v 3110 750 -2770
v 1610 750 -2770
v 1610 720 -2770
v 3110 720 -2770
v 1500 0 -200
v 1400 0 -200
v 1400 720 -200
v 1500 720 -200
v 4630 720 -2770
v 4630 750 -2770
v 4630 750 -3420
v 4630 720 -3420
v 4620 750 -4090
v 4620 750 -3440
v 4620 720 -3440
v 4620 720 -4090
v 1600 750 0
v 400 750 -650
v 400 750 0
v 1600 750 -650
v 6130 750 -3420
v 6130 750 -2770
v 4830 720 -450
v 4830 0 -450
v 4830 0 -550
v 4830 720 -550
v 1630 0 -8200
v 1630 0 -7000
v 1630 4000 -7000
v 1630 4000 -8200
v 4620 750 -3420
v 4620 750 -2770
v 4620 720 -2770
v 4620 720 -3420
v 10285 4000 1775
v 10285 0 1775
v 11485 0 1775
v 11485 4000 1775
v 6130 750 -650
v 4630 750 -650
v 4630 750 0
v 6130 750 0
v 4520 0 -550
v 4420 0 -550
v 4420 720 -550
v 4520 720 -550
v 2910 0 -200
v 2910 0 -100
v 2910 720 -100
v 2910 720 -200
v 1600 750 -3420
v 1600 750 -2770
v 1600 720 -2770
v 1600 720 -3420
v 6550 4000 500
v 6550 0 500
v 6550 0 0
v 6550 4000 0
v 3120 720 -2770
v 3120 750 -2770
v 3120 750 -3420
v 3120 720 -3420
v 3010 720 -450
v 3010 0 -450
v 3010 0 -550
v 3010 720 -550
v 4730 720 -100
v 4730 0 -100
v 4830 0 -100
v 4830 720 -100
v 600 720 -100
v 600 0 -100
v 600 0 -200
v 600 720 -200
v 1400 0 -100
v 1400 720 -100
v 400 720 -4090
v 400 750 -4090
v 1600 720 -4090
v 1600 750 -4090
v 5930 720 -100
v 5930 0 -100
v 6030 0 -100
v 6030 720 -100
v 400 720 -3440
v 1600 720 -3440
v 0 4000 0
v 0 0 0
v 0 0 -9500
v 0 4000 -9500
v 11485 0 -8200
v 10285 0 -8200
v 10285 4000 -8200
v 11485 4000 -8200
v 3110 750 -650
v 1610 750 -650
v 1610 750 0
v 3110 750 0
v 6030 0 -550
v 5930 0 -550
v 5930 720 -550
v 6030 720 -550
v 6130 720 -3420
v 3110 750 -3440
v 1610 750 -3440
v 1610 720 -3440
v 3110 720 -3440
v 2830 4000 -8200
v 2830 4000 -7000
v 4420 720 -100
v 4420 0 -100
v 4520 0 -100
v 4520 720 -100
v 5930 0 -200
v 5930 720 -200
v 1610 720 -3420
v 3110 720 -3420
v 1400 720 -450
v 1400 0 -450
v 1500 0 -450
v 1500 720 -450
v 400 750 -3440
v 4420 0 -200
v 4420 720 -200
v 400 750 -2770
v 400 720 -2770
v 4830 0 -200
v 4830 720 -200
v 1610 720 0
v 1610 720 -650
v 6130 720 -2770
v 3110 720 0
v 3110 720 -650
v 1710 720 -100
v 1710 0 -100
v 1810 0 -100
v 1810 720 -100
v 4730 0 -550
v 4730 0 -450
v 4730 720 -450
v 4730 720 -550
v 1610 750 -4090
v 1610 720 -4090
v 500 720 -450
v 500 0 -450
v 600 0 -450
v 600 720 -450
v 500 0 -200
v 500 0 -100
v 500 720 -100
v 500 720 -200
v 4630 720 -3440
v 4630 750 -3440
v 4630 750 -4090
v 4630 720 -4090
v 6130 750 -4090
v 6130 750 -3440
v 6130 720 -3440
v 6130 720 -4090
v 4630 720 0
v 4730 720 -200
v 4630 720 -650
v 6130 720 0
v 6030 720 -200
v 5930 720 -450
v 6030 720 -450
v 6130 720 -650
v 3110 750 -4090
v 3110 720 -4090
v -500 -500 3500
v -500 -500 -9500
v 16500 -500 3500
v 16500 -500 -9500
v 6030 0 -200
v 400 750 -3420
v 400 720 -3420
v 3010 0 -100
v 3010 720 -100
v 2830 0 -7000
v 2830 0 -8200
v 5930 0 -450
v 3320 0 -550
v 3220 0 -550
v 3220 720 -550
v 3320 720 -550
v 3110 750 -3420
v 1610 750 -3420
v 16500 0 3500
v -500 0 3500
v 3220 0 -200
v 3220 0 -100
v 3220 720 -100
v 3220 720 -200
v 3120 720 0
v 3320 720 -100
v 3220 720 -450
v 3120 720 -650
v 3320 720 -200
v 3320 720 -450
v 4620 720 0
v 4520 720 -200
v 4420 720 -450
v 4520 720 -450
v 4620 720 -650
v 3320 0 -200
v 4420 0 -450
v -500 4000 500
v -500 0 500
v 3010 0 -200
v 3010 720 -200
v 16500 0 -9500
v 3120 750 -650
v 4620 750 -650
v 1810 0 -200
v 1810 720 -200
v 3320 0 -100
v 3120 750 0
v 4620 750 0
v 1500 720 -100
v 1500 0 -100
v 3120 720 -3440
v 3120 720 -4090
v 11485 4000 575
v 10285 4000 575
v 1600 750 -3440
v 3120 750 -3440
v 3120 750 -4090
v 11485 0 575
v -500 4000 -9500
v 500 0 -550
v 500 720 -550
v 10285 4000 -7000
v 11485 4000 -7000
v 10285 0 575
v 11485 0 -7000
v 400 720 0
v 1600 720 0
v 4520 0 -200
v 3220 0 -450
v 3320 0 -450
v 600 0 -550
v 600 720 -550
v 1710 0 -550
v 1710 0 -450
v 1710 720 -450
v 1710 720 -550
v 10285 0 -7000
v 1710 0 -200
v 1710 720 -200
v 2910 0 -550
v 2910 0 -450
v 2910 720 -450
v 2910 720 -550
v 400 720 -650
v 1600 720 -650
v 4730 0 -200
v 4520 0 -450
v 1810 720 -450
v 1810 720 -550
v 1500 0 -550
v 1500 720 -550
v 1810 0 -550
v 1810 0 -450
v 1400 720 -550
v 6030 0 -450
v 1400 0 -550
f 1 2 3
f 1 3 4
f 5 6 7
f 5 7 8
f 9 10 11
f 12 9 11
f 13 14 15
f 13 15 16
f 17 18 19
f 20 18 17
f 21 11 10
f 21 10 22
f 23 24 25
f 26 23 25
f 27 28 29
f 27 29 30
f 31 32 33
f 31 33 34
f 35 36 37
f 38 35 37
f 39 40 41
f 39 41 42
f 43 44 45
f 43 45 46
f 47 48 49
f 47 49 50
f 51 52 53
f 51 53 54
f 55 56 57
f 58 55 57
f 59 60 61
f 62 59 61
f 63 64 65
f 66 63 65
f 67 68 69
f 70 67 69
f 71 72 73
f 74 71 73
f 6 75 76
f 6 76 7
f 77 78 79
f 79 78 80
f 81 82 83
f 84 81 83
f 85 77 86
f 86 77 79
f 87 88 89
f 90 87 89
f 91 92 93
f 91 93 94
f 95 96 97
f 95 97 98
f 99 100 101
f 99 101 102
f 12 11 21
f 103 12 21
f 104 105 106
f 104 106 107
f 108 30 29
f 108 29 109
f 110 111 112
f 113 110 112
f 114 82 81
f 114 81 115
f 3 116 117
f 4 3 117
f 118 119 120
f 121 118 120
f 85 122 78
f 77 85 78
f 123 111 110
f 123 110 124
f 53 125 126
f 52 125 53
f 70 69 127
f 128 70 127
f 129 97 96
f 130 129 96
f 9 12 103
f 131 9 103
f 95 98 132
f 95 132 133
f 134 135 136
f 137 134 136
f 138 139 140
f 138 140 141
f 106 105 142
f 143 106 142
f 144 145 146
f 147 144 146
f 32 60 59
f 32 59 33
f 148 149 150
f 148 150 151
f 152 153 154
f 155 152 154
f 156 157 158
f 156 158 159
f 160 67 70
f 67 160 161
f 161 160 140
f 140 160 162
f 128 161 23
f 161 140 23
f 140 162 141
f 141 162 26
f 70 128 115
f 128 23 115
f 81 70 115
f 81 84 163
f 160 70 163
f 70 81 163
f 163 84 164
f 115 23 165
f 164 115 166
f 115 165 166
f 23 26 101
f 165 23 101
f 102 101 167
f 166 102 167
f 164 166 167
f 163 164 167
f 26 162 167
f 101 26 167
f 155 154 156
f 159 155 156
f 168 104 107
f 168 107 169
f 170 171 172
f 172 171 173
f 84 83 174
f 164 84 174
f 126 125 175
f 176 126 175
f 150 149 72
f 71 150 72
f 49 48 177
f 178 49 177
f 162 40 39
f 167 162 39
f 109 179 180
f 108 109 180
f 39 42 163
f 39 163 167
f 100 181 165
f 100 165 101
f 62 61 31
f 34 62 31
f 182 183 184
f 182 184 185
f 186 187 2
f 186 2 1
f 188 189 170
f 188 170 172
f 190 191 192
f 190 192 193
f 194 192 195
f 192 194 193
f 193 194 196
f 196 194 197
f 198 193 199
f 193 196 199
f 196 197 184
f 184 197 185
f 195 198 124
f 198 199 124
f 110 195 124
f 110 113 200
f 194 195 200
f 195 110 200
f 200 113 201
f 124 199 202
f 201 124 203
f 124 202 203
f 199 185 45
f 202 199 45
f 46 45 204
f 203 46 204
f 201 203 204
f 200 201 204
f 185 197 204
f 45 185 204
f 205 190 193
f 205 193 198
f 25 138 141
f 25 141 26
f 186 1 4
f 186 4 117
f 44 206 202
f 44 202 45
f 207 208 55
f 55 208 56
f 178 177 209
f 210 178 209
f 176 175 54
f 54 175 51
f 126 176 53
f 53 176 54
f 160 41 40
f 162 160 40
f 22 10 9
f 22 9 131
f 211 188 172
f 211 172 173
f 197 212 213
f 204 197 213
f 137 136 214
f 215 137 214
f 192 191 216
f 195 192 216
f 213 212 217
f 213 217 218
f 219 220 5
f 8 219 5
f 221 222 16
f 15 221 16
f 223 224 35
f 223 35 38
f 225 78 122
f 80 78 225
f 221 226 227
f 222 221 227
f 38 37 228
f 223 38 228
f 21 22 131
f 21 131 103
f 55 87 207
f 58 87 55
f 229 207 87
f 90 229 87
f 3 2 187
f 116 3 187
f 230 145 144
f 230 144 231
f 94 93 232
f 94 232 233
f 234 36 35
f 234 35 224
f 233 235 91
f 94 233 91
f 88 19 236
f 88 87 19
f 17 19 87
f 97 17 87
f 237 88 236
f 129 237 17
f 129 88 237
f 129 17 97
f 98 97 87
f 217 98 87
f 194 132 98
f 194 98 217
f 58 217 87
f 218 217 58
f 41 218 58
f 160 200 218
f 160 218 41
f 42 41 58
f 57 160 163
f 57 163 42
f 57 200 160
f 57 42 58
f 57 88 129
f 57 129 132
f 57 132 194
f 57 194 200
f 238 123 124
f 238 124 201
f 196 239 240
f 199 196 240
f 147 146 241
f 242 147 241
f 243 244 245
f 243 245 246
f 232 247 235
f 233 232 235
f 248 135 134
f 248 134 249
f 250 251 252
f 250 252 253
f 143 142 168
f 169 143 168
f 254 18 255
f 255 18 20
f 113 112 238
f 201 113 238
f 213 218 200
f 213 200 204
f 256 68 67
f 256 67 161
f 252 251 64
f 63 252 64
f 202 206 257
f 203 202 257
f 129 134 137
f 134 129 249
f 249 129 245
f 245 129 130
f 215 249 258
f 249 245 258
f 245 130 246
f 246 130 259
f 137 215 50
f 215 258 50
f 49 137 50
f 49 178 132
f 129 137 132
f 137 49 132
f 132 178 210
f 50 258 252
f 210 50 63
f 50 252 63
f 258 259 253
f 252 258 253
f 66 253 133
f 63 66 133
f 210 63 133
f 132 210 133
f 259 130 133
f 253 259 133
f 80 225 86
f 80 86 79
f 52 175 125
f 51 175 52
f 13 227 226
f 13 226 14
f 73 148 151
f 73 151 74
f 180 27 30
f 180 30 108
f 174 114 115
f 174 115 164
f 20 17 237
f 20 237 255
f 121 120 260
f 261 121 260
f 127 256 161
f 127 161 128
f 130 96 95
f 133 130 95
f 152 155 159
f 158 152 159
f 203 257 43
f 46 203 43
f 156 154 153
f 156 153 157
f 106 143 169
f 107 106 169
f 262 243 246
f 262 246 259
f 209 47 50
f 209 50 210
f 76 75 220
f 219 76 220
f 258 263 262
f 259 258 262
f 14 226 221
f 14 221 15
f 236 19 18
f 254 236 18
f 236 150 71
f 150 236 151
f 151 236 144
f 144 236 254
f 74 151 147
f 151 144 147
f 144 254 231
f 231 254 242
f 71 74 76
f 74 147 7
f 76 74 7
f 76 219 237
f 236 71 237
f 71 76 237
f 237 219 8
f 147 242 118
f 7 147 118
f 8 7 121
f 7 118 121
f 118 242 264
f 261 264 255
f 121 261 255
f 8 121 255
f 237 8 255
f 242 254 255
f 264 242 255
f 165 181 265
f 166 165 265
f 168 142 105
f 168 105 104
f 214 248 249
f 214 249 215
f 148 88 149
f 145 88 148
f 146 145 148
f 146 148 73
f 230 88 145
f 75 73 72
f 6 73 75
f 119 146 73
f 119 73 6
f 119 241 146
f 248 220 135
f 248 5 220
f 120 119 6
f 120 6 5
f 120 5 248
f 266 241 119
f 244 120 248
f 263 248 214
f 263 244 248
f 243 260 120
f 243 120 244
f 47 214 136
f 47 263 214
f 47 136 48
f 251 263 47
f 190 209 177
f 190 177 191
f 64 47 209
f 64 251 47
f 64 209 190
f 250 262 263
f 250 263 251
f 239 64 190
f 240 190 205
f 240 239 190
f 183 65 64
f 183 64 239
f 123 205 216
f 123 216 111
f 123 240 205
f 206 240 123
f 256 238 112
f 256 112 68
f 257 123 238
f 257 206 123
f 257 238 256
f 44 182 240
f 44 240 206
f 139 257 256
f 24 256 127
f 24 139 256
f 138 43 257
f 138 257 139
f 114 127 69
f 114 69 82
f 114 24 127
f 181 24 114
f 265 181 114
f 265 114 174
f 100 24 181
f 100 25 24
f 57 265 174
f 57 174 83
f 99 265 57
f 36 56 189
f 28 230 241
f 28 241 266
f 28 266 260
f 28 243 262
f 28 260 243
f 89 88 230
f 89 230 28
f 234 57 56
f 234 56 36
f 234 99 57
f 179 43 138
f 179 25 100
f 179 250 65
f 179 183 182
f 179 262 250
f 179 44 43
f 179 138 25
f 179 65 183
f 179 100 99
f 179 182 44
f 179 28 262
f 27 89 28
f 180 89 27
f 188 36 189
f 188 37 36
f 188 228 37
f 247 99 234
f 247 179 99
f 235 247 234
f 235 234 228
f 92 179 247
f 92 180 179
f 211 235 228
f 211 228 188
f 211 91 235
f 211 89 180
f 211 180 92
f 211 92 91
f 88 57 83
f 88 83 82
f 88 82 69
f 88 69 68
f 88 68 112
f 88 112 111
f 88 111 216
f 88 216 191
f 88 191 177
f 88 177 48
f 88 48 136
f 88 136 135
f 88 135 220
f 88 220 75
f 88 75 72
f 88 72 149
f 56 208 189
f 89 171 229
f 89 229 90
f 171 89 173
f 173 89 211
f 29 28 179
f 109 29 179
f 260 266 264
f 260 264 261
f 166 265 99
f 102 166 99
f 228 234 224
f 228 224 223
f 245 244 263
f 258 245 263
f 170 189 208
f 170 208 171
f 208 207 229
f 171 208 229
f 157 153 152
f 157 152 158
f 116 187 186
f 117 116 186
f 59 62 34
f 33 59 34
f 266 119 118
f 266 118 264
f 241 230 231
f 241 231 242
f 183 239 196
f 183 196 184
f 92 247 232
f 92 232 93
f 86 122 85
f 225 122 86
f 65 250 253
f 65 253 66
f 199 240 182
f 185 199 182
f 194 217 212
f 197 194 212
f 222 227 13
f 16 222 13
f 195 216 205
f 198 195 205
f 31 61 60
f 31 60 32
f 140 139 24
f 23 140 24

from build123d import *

# Parameters (mm, degrees)
SKETCH_2_W      = 6550
SKETCH_2_H      = 500
SKETCH_2_W_2    = 1200
SKETCH_2_H_2    = 1200
EXTRUDE_5_DEPTH = 4000
SKETCH_3_W      = 17000
SKETCH_3_H      = 13000
EXTRUDE_6_DEPTH = 500
EXTRUDE_START   = 750
SKETCH_4_W      = 1200
SKETCH_4_H      = 650
SKETCH_4_W_2    = 1500
EXTRUDE_7_DEPTH = 30
SKETCH_4_3_W    = 100
SKETCH_4_3_H    = 100
EXTRUDE_8_DEPTH = 720


with BuildPart() as part:
    # 草图2 → 凸台-拉伸5 (new body)
    with BuildSketch(Plane(origin=(0, 0, 0), x_dir=(1, 0, 0), z_dir=(0, 1, 0))):
        Polygon((-500, -500), (0, -500), (0, 0), (0, 9500), (-500, 9500), align=None)
        with Locations((3275, -250)):
            Rectangle(SKETCH_2_W, SKETCH_2_H)
        with Locations((2230, 7600)):
            Rectangle(SKETCH_2_W_2, SKETCH_2_H_2)
        with Locations((10885, 7600)):
            Rectangle(SKETCH_2_W_2, SKETCH_2_H_2)
        with Locations((10885, -1175)):
            Rectangle(SKETCH_2_W_2, SKETCH_2_H_2)
    extrude(amount=EXTRUDE_5_DEPTH)

    # 草图3 → 凸台-拉伸6 (add)
    with BuildSketch(Plane(origin=(0, 0, 0), x_dir=(1, 0, 0), z_dir=(0, 1, 0))):
        with Locations((8000, 3000)):
            Rectangle(SKETCH_3_W, SKETCH_3_H)
    extrude(amount=-EXTRUDE_6_DEPTH)

    # 草图4 → 凸台-拉伸7 (add)
    with BuildSketch(Plane(origin=(0, 0, 0), x_dir=(1, 0, 0), z_dir=(0, 1, 0)).offset(EXTRUDE_START)):
        with Locations((1000, 325)):
            Rectangle(SKETCH_4_W, SKETCH_4_H)
        with Locations((2360, 325)):
            Rectangle(SKETCH_4_W_2, SKETCH_4_H)
        with Locations((5380, 3095)):
            Rectangle(SKETCH_4_W_2, SKETCH_4_H)
        with Locations((3870, 325)):
            Rectangle(SKETCH_4_W_2, SKETCH_4_H)
        with Locations((5380, 325)):
            Rectangle(SKETCH_4_W_2, SKETCH_4_H)
        with Locations((1000, 3095)):
            Rectangle(SKETCH_4_W, SKETCH_4_H)
        with Locations((2360, 3095)):
            Rectangle(SKETCH_4_W_2, SKETCH_4_H)
        with Locations((1000, 3765)):
            Rectangle(SKETCH_4_W, SKETCH_4_H)
        with Locations((3870, 3095)):
            Rectangle(SKETCH_4_W_2, SKETCH_4_H)
        with Locations((2360, 3765)):
            Rectangle(SKETCH_4_W_2, SKETCH_4_H)
        with Locations((3870, 3765)):
            Rectangle(SKETCH_4_W_2, SKETCH_4_H)
        with Locations((5380, 3765)):
            Rectangle(SKETCH_4_W_2, SKETCH_4_H)
    extrude(amount=-EXTRUDE_7_DEPTH)


with BuildPart() as extrude_7_piece_1:
    # of the separate pieces the step leaves, piece 1, a body of its own (extrude_7_pieces)
    add(part.part.solids().sort_by_distance((-500, 0, 500))[0])

    # 草图4<3> → 凸台-拉伸8 (add)
    with BuildSketch(Plane(origin=(0, 0, 0), x_dir=(1, 0, 0), z_dir=(0, 1, 0))):
        with Locations((1450, 500)):
            Rectangle(SKETCH_4_3_W, SKETCH_4_3_H)
        with Locations((550, 500)):
            Rectangle(SKETCH_4_3_W, SKETCH_4_3_H)
        with Locations((550, 150)):
            Rectangle(SKETCH_4_3_W, SKETCH_4_3_H)
        with Locations((1760, 500)):
            Rectangle(SKETCH_4_3_W, SKETCH_4_3_H)
        with Locations((1450, 150)):
            Rectangle(SKETCH_4_3_W, SKETCH_4_3_H)
        with Locations((1760, 150)):
            Rectangle(SKETCH_4_3_W, SKETCH_4_3_H)
        with Locations((2960, 500)):
            Rectangle(SKETCH_4_3_W, SKETCH_4_3_H)
        with Locations((2960, 150)):
            Rectangle(SKETCH_4_3_W, SKETCH_4_3_H)
        with Locations((3270, 500)):
            Rectangle(SKETCH_4_3_W, SKETCH_4_3_H)
        with Locations((3270, 150)):
            Rectangle(SKETCH_4_3_W, SKETCH_4_3_H)
        with Locations((4470, 500)):
            Rectangle(SKETCH_4_3_W, SKETCH_4_3_H)
        with Locations((4470, 150)):
            Rectangle(SKETCH_4_3_W, SKETCH_4_3_H)
        with Locations((4780, 500)):
            Rectangle(SKETCH_4_3_W, SKETCH_4_3_H)
        with Locations((4780, 150)):
            Rectangle(SKETCH_4_3_W, SKETCH_4_3_H)
        with Locations((5980, 500)):
            Rectangle(SKETCH_4_3_W, SKETCH_4_3_H)
        with Locations((5980, 150)):
            Rectangle(SKETCH_4_3_W, SKETCH_4_3_H)
    extrude(amount=EXTRUDE_8_DEPTH)


with BuildPart() as extrude_7_piece_2:
    # of the separate pieces the step leaves, piece 2, a body of its own (extrude_7_pieces)
    add(part.part.solids().sort_by_distance((4620, 750, -4090))[0])


with BuildPart() as extrude_7_piece_3:
    # of the separate pieces the step leaves, piece 3, a body of its own (extrude_7_pieces)
    add(part.part.solids().sort_by_distance((1610, 750, -3420))[0])


with BuildPart() as extrude_7_piece_4:
    # of the separate pieces the step leaves, piece 4, a body of its own (extrude_7_pieces)
    add(part.part.solids().sort_by_distance((4620, 750, -3420))[0])


with BuildPart() as extrude_7_piece_5:
    # of the separate pieces the step leaves, piece 5, a body of its own (extrude_7_pieces)
    add(part.part.solids().sort_by_distance((3110, 750, -4090))[0])


with BuildPart() as extrude_7_piece_6:
    # of the separate pieces the step leaves, piece 6, a body of its own (extrude_7_pieces)
    add(part.part.solids().sort_by_distance((6130, 750, -4090))[0])


with BuildPart() as extrude_7_piece_7:
    # of the separate pieces the step leaves, piece 7, a body of its own (extrude_7_pieces)
    add(part.part.solids().sort_by_distance((6130, 750, -3420))[0])


with BuildPart() as extrude_7_piece_8:
    # of the separate pieces the step leaves, piece 8, a body of its own (extrude_7_pieces)
    add(part.part.solids().sort_by_distance((1600, 750, -4090))[0])


with BuildPart() as extrude_7_piece_9:
    # of the separate pieces the step leaves, piece 9, a body of its own (extrude_7_pieces)
    add(part.part.solids().sort_by_distance((1600, 750, -3420))[0])


solid = Compound([extrude_7_piece_1.part, extrude_7_piece_2.part, extrude_7_piece_3.part, extrude_7_piece_4.part, extrude_7_piece_5.part, extrude_7_piece_6.part, extrude_7_piece_7.part, extrude_7_piece_8.part, extrude_7_piece_9.part])
